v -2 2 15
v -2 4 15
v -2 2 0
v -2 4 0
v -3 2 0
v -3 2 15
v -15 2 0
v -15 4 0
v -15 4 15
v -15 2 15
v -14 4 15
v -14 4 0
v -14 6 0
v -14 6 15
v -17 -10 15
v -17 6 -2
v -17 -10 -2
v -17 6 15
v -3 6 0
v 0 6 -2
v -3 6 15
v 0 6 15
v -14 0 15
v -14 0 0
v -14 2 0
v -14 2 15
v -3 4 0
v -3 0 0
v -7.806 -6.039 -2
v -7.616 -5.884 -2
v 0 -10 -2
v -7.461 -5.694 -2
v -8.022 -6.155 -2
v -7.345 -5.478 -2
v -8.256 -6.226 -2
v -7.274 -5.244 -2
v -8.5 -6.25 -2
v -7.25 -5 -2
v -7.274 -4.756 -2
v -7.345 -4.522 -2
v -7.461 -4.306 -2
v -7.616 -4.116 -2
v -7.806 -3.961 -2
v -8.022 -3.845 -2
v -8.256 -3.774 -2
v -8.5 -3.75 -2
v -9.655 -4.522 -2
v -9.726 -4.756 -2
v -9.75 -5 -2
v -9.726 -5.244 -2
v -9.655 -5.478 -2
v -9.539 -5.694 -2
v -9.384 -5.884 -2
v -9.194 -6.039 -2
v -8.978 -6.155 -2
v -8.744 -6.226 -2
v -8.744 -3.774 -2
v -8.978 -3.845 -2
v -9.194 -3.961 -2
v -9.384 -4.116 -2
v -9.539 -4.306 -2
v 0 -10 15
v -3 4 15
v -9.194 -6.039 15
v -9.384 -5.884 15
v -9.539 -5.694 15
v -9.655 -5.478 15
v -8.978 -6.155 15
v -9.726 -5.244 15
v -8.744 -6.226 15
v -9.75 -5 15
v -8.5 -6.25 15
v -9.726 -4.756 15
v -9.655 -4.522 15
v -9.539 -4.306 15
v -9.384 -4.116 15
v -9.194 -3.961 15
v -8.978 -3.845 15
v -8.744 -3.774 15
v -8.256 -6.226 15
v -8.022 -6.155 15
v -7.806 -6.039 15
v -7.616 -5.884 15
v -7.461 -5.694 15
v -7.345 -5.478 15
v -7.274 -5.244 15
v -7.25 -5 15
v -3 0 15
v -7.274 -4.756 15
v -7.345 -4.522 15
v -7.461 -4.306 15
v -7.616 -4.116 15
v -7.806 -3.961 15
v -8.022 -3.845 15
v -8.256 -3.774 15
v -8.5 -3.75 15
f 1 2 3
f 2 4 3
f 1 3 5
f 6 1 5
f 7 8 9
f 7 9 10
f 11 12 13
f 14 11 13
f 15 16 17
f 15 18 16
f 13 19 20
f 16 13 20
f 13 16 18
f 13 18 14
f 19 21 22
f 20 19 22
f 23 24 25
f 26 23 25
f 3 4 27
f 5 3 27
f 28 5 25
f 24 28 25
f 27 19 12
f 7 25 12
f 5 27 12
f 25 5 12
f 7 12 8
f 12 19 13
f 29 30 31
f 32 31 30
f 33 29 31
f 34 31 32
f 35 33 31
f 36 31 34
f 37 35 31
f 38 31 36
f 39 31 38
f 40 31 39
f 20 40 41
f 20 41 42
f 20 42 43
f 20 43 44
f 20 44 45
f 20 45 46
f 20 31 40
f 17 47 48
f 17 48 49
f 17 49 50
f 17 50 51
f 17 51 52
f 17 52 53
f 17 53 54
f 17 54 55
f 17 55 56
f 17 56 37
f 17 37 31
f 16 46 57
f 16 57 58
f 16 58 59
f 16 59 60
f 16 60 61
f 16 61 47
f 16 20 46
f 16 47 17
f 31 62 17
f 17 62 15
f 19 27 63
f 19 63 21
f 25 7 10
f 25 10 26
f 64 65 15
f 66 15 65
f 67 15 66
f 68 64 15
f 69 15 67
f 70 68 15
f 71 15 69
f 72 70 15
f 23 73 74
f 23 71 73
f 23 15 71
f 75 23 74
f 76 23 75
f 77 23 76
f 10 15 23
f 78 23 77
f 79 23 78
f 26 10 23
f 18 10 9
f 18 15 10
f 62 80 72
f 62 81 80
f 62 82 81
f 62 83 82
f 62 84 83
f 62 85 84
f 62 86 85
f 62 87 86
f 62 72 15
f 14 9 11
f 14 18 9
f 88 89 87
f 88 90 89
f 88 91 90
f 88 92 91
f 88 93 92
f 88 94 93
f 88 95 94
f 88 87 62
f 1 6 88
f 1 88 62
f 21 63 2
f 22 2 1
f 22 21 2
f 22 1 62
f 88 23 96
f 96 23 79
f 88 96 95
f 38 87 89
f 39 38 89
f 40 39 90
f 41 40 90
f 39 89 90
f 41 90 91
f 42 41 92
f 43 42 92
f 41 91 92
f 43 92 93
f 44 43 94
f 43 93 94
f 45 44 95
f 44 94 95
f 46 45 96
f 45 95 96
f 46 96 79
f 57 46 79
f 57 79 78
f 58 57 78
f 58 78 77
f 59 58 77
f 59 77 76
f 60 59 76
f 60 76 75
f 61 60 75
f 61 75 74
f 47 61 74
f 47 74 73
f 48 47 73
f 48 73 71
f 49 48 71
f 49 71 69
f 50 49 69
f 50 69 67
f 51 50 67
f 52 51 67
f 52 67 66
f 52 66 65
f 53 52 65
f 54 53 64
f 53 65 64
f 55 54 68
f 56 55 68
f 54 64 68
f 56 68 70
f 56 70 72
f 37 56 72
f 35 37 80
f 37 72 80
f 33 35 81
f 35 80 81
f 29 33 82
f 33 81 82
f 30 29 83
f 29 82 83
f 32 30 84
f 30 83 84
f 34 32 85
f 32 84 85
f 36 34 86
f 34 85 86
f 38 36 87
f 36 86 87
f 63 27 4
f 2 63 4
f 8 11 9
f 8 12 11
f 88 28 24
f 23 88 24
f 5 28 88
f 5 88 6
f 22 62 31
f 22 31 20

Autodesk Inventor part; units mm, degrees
ref_plane "YZ Plane" through (0, 0, 0) normal (1, 0, 0) x (0, 1, 0)
ref_plane "XZ Plane" through (0, 0, 0) normal (0, 1, 0) x (-1, 0, 0)
ref_plane "XY Plane" through (0, 0, 0) normal (0, 0, 1) x (1, 0, 0)
sketch "Sketch1" plane through (0, 0, 0) normal (0, 0, 1) x (1, 0, 0)
  line L0 (0, 0) -> (-17, 0)
  line L1 (-17, 0) -> (-17, -10)
  line L2 (-17, -10) -> (0, -10)
  line L3 (0, -10) -> (0, 0)
  line L4 (-17, 0) -> (-14, 0)
  line L5 (-14, 0) -> (-14, 6)
  line L6 (-14, 6) -> (-17, 6)
  line L7 (-17, 6) -> (-17, 0)
  line L8 (-14, 4) -> (-15, 4)
  line L9 (-15, 4) -> (-15, 2)
  line L10 (-15, 2) -> (-14, 2)
  line L11 (-14, 2) -> (-14, 4)
  line L12 (0, 0) -> (-3, 0)
  line L13 (-3, 0) -> (-3, 6)
  line L14 (-3, 6) -> (0, 6)
  line L15 (0, 6) -> (0, 0)
  line L16 (-3, 4) -> (-2, 4)
  line L17 (-2, 4) -> (-2, 2)
  line L18 (-2, 2) -> (-3, 2)
  line L19 (-3, 2) -> (-3, 4)
  dimension "d1" = 10
  dimension "d10" = 13
  dimension "d11" = 2
  dimension "d12" = 2
  dimension "d13" = 2
  dimension "d14" = 2
  dimension "d15" = 2
  dimension "d16" = 1
  dimension "d17" = 1
extrude "Extrusion1" add sketch "Sketch1" along normal blind 15 contours L3 L2 L1 L0 | L0 L13 L18 L17 L16 L14 L15 | L0 L7 L6 L5 L8 L9 L10
sketch "Sketch2" plane through (0, 0, 15) normal (0, 0, 1) x (1, 0, 0)
  circle A0 centre (-8.5, -5) radius 1.25
  line L0 (0, 0) -> (-14, 0) projected
  point P0 (-17, 0)
  point P1 (-8.5, 0)
  dimension "d4" = 5
  dimension "d5" = 2.5
sketch "Sketch4" plane through (0, 0, 0) normal (0, 0, -1) x (-1, 0, 0)
  line L0 (0, -10) -> (0, 6) projected
  line L1 (17, 6) -> (17, -10) projected
  line L2 (0, -10) -> (17, -10)
  line L3 (17, -10) -> (17, 6)
  line L4 (17, 6) -> (0, 6)
  line L5 (0, 6) -> (0, -10)
  point P0 (0, 0)
  point P1 (0, 6)
extrude "Extrusion3" add sketch "Sketch4" along normal blind 2
extrude "Extrusion4" cut sketch "Sketch2" against normal through all
equation "\"d15\" = d11"
equation "\"d16\" = d17"
properties part number "usb port mount"
